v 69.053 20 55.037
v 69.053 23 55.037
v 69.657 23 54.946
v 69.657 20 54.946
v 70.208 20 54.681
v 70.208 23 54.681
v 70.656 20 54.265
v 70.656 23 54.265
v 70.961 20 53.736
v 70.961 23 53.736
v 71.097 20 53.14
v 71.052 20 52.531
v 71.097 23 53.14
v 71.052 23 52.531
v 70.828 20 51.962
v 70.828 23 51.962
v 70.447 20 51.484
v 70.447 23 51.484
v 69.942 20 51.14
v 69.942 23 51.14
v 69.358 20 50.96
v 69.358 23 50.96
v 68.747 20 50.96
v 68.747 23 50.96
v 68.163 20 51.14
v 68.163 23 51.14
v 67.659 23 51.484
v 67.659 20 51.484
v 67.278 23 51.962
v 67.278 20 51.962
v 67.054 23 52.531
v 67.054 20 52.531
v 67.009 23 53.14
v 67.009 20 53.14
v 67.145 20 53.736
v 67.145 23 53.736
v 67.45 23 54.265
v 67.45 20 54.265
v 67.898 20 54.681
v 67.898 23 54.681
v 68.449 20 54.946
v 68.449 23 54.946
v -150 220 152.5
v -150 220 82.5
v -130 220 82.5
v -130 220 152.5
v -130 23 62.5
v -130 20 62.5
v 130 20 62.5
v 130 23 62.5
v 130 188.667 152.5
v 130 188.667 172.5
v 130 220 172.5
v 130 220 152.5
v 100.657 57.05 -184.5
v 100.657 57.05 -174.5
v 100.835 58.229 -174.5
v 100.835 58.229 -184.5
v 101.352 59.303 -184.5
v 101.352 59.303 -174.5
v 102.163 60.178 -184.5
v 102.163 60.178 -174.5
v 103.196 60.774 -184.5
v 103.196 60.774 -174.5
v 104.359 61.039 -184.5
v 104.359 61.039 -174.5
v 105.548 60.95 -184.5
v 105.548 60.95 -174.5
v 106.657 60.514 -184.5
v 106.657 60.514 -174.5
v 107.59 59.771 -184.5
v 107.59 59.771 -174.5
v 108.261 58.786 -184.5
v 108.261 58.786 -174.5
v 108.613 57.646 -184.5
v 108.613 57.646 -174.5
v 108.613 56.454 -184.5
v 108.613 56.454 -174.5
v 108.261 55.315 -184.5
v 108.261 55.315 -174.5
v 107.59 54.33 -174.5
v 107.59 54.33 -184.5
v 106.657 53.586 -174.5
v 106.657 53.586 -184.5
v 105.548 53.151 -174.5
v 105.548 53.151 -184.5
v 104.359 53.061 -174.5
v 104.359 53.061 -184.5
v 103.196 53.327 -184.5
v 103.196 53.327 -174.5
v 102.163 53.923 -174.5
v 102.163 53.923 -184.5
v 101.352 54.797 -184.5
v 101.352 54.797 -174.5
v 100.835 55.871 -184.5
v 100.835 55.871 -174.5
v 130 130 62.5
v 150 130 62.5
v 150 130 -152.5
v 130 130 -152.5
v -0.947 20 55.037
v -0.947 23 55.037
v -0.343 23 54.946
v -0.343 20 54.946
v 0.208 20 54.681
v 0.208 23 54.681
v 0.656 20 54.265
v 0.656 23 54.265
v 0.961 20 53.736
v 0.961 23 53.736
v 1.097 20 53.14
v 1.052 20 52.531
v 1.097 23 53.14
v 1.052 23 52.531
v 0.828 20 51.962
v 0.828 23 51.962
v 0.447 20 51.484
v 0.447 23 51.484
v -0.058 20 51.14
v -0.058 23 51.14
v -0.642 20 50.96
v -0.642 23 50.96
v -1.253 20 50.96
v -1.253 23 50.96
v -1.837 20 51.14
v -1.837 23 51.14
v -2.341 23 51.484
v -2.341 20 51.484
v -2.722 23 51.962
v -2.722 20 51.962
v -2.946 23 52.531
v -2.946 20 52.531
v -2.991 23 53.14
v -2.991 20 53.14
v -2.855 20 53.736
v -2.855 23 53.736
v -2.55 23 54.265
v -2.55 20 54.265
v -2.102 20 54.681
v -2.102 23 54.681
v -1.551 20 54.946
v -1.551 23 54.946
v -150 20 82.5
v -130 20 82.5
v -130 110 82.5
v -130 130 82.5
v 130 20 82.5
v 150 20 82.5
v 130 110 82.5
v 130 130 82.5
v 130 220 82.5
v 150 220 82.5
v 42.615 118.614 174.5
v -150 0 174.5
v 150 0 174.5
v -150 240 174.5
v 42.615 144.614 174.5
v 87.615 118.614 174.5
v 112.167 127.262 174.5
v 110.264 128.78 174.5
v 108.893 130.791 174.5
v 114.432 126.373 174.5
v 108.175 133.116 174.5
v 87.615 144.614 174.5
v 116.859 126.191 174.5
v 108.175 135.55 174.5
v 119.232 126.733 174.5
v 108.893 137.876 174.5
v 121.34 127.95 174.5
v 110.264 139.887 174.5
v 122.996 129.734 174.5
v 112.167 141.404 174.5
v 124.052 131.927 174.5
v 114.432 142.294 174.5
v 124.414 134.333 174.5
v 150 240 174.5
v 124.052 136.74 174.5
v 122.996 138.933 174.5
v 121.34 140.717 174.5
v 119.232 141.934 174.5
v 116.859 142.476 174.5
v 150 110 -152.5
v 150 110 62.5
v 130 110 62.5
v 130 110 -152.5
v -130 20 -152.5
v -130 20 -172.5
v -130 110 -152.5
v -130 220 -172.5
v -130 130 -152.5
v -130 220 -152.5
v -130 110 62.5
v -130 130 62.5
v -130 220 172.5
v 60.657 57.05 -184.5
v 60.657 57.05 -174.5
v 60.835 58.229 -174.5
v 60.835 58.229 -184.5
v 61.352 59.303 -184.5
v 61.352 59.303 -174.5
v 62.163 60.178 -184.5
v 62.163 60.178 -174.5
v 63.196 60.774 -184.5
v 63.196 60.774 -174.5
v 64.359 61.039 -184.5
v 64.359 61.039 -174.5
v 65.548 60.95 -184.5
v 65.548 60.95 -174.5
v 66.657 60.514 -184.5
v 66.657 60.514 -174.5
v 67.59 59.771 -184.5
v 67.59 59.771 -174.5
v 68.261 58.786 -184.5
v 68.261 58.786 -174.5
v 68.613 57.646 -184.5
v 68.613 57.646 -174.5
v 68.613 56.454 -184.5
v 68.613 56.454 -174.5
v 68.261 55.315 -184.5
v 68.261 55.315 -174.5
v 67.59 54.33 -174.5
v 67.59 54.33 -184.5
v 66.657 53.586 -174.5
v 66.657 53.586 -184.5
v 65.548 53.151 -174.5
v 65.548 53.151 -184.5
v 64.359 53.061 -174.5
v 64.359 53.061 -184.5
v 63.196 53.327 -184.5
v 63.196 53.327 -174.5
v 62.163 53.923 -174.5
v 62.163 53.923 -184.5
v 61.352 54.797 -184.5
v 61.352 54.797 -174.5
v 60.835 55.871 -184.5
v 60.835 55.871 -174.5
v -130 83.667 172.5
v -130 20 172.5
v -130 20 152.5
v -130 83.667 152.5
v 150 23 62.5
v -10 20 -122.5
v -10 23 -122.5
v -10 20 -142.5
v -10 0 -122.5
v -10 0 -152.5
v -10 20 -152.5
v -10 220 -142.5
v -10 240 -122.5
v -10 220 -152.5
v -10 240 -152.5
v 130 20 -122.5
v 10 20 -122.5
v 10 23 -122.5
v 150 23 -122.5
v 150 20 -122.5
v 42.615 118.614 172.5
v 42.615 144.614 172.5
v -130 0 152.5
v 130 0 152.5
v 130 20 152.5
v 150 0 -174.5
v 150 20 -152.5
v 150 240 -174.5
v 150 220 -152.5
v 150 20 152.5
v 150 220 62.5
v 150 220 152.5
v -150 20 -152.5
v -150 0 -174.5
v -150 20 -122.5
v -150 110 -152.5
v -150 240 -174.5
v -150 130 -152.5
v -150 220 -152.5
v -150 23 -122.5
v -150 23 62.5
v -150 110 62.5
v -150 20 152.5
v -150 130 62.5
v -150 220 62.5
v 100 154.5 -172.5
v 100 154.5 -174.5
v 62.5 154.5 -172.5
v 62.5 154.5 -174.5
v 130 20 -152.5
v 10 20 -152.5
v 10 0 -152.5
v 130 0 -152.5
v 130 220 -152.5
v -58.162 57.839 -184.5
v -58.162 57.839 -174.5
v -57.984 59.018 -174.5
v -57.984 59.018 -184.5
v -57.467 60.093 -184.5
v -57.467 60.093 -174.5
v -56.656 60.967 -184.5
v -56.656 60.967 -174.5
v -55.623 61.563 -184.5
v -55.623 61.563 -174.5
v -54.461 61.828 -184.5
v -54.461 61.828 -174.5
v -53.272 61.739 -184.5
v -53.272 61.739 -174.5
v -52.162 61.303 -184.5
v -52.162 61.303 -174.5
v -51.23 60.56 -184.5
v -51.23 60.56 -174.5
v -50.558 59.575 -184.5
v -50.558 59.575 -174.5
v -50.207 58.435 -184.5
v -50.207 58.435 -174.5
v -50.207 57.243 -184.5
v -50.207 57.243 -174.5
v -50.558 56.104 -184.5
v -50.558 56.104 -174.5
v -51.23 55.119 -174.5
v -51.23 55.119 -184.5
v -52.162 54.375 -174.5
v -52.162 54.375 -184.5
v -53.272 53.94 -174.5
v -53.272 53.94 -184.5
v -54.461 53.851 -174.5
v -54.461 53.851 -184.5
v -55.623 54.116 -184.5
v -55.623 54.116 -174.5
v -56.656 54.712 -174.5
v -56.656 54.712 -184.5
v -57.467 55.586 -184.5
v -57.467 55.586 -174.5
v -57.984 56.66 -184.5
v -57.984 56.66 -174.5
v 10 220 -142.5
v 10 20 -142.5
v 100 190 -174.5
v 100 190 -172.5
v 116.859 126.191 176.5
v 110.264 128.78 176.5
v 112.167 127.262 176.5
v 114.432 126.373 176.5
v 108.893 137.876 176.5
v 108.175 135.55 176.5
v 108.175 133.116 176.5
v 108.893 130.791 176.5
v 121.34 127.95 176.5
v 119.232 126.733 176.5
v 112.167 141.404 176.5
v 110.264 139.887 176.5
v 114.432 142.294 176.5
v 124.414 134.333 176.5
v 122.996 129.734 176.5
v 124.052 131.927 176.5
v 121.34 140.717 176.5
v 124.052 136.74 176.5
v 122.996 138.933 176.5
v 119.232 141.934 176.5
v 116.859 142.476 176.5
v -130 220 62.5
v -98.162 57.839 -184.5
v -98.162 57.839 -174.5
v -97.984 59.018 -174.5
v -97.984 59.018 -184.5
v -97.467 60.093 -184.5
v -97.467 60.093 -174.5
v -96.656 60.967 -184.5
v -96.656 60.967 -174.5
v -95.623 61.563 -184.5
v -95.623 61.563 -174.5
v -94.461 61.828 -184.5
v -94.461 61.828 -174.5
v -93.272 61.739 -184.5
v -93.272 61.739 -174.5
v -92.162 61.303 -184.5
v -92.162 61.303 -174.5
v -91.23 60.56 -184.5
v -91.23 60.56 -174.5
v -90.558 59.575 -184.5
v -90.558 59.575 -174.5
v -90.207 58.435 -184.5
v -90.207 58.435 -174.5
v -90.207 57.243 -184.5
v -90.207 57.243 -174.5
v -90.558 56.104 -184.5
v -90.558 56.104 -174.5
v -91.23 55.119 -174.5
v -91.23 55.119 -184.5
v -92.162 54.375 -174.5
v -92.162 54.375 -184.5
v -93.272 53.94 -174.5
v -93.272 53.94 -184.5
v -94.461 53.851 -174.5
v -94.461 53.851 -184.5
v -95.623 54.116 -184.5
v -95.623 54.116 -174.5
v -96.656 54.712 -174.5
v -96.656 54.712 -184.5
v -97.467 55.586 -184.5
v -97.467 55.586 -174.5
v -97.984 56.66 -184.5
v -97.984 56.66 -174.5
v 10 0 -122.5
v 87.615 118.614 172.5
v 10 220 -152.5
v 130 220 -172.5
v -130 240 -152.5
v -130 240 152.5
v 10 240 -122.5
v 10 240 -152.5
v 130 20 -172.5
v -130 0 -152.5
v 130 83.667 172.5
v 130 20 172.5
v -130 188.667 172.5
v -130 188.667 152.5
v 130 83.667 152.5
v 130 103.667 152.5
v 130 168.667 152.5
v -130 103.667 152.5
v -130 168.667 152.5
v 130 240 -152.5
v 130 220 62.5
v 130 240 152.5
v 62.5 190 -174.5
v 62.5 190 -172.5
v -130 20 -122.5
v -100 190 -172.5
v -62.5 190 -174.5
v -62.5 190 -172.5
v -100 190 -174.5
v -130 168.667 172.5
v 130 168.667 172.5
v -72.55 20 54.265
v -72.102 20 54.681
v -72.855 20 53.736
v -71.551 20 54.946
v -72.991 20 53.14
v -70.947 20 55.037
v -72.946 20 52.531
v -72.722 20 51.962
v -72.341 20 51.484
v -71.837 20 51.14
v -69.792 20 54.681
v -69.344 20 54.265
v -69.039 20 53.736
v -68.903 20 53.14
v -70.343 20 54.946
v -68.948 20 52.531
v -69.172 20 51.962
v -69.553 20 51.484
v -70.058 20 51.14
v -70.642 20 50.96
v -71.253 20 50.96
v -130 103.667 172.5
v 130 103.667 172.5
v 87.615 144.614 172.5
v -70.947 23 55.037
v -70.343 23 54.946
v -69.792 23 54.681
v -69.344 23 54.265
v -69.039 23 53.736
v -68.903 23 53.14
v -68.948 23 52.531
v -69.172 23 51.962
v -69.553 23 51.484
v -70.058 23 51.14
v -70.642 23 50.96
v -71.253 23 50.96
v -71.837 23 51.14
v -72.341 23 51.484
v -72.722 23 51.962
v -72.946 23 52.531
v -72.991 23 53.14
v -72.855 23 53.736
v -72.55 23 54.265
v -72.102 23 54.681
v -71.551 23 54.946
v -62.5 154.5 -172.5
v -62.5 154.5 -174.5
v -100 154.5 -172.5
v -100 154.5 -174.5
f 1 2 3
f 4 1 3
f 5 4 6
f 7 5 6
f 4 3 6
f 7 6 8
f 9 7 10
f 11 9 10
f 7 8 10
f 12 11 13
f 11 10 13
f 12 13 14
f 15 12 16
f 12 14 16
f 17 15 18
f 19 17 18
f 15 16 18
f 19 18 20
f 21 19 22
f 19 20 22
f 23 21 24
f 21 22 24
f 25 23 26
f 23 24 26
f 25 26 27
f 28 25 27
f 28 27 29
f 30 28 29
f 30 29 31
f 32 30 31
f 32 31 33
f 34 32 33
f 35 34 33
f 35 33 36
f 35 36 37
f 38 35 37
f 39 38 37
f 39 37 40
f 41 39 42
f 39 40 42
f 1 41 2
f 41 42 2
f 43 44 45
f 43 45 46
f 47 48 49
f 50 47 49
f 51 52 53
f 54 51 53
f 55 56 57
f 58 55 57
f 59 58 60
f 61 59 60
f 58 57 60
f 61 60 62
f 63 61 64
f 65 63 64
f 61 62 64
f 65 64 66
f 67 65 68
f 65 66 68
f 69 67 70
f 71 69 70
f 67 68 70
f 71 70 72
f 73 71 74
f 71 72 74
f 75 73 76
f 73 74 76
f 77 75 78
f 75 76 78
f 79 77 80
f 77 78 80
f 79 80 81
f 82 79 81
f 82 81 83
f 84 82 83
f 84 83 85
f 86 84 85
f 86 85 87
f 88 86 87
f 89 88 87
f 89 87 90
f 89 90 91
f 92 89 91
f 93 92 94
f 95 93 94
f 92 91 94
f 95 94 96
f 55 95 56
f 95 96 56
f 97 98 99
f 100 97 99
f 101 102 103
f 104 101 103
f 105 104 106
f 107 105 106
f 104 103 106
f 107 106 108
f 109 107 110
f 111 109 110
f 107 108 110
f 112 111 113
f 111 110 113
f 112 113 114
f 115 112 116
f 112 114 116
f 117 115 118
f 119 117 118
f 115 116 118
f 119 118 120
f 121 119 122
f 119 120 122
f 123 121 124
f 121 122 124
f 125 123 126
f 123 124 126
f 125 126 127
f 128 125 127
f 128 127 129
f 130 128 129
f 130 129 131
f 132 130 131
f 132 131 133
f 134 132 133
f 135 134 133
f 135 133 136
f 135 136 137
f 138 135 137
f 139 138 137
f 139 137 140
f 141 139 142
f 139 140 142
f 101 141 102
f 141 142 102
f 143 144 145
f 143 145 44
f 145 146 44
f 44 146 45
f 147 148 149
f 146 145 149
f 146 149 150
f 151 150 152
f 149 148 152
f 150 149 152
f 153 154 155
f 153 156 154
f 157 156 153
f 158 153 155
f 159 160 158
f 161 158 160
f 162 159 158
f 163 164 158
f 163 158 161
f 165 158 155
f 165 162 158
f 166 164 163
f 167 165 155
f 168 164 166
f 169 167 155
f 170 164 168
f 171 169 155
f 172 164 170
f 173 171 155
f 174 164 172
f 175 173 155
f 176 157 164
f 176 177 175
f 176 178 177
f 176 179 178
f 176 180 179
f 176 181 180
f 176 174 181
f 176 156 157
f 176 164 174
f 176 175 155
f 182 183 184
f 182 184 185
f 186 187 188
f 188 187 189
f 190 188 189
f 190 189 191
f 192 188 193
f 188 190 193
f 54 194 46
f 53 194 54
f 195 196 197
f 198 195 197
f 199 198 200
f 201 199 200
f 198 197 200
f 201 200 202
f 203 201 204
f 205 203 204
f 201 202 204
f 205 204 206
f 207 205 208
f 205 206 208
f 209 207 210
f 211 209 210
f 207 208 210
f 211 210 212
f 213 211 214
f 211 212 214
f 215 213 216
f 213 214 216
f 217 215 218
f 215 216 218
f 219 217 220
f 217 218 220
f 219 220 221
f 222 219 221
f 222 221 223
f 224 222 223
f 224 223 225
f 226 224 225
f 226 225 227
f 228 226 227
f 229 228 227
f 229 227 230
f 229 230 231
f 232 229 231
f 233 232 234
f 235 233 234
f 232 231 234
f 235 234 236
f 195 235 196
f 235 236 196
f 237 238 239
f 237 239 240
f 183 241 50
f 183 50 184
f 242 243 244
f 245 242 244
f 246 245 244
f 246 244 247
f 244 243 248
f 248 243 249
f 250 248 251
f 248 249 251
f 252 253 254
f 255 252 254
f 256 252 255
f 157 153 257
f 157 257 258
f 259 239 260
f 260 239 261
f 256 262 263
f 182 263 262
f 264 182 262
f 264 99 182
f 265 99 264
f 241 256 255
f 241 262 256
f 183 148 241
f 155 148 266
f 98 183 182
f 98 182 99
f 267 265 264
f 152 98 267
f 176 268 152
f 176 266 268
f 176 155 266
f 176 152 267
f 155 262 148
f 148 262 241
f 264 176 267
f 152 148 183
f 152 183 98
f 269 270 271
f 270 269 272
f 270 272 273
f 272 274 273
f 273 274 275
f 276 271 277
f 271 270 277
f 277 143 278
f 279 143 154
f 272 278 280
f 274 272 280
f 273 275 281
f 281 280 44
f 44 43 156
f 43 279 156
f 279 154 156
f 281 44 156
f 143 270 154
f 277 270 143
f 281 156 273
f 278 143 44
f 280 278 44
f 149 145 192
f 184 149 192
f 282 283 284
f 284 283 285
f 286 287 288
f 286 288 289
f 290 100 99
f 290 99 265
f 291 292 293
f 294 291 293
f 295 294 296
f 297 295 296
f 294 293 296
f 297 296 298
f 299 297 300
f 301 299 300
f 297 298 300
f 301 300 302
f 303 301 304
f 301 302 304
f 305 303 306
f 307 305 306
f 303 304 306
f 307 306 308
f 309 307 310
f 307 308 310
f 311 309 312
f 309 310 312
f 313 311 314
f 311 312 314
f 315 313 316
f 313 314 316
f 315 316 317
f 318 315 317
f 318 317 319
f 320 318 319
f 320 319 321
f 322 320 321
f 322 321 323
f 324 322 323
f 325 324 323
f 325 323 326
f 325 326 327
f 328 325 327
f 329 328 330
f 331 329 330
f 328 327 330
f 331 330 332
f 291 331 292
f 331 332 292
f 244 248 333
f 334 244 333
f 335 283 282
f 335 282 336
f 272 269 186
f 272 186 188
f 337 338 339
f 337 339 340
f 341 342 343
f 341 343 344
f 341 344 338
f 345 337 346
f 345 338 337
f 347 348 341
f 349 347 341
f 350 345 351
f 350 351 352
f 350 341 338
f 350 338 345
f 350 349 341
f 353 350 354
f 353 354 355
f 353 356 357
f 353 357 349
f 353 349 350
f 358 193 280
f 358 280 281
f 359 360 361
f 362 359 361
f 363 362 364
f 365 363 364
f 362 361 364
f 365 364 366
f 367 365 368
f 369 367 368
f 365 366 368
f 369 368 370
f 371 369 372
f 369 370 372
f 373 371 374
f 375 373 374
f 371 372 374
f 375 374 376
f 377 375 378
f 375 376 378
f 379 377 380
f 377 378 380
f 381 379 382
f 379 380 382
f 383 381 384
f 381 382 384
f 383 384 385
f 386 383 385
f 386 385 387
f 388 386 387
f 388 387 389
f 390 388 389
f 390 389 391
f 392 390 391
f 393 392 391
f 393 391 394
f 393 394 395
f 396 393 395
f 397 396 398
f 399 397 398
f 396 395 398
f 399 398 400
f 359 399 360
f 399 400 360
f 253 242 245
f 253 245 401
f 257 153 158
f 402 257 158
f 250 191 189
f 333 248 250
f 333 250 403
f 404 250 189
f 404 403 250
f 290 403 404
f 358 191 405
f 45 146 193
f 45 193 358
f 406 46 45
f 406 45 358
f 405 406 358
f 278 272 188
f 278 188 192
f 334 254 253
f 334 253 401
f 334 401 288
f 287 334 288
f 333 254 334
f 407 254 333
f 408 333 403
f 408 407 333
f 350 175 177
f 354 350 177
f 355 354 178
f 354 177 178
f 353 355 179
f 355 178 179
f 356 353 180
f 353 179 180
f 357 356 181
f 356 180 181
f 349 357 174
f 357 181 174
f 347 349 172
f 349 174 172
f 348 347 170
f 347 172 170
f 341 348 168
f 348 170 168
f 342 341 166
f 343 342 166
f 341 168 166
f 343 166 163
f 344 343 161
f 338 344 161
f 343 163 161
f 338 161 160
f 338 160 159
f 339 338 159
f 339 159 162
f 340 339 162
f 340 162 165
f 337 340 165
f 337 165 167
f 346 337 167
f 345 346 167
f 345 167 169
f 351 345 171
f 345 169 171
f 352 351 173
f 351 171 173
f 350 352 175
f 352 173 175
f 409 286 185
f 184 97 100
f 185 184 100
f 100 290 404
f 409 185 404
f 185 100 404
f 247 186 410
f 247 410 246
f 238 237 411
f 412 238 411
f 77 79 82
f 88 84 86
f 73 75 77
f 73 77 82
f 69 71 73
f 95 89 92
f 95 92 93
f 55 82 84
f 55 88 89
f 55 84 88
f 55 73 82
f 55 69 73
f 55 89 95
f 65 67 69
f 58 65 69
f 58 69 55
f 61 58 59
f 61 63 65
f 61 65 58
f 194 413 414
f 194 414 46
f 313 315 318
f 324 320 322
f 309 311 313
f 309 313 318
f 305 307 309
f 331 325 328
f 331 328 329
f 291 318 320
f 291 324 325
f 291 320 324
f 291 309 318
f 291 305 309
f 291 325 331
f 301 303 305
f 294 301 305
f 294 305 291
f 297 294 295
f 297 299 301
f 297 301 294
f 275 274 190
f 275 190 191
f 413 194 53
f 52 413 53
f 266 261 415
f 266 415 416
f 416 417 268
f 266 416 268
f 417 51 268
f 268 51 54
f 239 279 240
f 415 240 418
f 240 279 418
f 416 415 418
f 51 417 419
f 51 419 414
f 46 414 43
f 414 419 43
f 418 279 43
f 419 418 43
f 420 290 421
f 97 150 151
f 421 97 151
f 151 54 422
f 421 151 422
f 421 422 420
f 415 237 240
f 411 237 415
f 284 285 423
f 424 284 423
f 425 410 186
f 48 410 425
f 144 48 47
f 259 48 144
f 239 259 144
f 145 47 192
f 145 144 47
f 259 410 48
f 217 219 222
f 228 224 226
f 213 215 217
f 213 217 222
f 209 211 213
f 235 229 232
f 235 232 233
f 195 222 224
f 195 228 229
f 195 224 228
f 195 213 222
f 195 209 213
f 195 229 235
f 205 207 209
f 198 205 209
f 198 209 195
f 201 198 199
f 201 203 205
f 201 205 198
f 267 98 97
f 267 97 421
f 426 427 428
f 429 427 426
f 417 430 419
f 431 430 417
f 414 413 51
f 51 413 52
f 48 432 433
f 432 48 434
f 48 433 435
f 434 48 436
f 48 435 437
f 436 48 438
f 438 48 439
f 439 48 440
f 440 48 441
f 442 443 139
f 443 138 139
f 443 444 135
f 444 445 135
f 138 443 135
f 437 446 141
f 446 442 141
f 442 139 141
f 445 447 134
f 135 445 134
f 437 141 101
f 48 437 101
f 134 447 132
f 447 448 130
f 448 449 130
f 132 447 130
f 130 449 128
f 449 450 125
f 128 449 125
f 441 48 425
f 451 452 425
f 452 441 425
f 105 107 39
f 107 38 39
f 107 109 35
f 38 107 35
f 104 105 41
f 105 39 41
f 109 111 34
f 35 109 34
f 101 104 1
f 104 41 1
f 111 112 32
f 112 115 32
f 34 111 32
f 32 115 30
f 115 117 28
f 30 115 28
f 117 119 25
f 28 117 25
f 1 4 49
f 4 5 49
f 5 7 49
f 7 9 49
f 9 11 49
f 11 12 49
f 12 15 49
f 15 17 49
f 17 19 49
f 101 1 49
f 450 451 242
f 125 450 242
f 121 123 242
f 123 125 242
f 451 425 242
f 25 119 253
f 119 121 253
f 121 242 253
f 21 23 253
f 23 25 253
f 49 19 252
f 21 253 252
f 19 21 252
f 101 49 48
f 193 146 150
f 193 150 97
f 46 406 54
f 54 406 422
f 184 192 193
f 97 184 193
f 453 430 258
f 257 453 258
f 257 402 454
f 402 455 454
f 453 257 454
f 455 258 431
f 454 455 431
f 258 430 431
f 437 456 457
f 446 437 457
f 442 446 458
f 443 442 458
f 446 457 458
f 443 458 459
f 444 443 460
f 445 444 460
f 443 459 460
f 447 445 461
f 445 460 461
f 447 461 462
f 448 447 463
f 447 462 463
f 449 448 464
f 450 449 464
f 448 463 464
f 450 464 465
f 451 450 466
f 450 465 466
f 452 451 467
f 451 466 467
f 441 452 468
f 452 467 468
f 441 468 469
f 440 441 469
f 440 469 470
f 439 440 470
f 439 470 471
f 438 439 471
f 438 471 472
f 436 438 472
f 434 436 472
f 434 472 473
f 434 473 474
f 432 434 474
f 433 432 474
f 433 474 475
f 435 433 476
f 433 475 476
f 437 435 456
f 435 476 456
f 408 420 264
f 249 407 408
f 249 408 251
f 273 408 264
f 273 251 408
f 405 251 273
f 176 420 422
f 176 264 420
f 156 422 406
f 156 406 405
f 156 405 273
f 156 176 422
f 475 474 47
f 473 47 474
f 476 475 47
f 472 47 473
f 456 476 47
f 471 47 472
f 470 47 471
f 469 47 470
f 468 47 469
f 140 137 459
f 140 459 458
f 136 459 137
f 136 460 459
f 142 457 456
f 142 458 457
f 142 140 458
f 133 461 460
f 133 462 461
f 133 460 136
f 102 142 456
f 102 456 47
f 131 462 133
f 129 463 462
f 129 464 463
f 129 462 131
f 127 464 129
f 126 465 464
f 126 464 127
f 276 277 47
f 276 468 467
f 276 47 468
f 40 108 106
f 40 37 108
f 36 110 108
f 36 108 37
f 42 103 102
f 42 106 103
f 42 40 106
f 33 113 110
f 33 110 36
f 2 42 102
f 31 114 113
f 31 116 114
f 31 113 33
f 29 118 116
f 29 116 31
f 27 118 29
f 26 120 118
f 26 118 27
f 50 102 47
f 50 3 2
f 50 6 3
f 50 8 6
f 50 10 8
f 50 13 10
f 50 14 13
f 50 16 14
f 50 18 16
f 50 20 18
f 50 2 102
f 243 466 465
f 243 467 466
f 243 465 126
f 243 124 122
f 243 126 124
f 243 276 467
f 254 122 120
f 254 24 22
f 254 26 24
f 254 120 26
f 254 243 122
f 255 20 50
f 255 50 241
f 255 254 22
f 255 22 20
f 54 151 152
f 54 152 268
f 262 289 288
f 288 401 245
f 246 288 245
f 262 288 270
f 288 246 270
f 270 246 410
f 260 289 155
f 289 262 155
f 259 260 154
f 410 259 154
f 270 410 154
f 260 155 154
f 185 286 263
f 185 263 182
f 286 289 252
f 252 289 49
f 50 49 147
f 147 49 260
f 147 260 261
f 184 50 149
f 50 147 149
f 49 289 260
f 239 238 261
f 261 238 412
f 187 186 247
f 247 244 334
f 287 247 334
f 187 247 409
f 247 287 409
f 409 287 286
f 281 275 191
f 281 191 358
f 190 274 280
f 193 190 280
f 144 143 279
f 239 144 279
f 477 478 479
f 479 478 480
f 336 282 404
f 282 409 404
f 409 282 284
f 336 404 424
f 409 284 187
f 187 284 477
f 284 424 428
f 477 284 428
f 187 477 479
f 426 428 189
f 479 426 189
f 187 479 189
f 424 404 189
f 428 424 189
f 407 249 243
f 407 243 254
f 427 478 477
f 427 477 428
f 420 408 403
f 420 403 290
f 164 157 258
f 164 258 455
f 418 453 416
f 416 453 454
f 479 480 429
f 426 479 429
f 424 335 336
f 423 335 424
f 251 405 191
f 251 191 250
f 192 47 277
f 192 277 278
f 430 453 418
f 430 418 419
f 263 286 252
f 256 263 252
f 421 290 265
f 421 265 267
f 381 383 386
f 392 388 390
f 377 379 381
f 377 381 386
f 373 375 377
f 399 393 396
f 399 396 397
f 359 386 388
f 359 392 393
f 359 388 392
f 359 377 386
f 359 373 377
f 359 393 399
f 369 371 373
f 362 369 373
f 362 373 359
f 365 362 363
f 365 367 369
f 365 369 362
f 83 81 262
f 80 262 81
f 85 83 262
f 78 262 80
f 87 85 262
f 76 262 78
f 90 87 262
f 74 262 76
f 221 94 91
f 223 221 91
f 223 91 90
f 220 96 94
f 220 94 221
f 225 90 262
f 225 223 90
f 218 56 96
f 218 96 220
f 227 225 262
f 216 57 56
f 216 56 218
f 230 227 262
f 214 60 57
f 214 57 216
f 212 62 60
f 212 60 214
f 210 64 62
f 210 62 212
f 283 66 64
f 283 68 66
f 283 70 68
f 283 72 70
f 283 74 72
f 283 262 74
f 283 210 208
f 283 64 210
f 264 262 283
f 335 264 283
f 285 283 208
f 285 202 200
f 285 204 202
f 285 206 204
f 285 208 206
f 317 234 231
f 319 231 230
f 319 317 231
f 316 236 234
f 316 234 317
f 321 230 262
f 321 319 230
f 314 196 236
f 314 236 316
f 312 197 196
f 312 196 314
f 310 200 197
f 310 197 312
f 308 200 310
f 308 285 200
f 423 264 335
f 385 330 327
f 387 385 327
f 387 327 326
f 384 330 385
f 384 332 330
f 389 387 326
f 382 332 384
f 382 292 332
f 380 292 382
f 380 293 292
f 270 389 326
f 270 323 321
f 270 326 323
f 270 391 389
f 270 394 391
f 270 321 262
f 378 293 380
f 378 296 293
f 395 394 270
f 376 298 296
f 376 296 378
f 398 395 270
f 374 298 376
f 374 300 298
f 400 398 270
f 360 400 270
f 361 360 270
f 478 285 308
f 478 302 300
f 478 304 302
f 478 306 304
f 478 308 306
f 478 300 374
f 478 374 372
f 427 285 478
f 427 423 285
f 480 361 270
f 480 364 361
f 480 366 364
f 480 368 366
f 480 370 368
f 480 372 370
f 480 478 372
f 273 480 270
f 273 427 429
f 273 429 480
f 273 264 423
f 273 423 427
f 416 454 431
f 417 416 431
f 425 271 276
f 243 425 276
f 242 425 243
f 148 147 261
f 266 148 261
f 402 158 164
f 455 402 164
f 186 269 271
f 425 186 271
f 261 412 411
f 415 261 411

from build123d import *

# Parameters (mm, degrees)
SKETCH_1_W          = 300
SKETCH_1_H          = 345
EXTRUDE_1_DEPTH     = 240
SKETCH_2_W          = 260
SKETCH_2_H          = 305
CUT_EXTRUDE_1_DEPTH = 240
SKETCH_3_W          = 260
SKETCH_3_H          = 200
CUT_EXTRUDE_2_DEPTH = 345
SKETCH_4_W          = 305
SKETCH_4_H          = 200
CUT_EXTRUDE_3_DEPTH = 345
SKETCH_5_W          = 20
SKETCH_5_H          = 240
EXTRUDE_2_DEPTH     = 20
SKETCH_6_W          = 20
SKETCH_6_H          = 240
EXTRUDE_3_DEPTH     = 20
SKETCH_10_W         = 20
SKETCH_10_H         = 240
EXTRUDE_7_DEPTH     = 50
SKETCH_11_W         = 20
SKETCH_11_H         = 200
CUT_EXTRUDE_4_DEPTH = 50
SKETCH_12_W         = 20
SKETCH_12_H         = 20
EXTRUDE_8_DEPTH     = 240
SKETCH_13_W         = 20
SKETCH_13_H         = 20
EXTRUDE_9_DEPTH     = 300
SKETCH_14_W         = 300
SKETCH_14_H         = 185
EXTRUDE_10_DEPTH    = 3
SKETCH_15_R         = 2.05
CUT_EXTRUDE_5_DEPTH = 3
SKETCH_16_W         = 215
SKETCH_16_H         = 20
EXTRUDE_11_DEPTH    = 20
SKETCH_17_W         = 215
SKETCH_17_H         = 20
EXTRUDE_12_DEPTH    = 20
SKETCH_18_W         = 300
SKETCH_18_H         = 240
EXTRUDE_13_DEPTH    = 2
SKETCH_20_W         = 300
SKETCH_20_H         = 240
EXTRUDE_14_DEPTH    = 2
SKETCH_21_R         = 8.165036004
EXTRUDE_15_DEPTH    = 2
SKETCH_22_W         = 300
SKETCH_22_H         = 20
EXTRUDE_16_DEPTH    = 22
SKETCH_24_W         = 45
SKETCH_24_H         = 26
CUT_EXTRUDE_6_DEPTH = 2
SKETCH_25_W         = 37.5
SKETCH_25_H         = 35.5
CUT_EXTRUDE_7_DEPTH = 2
SKETCH_26_W         = 37.5
SKETCH_26_H         = 35.5
CUT_EXTRUDE_8_DEPTH = 2
SKETCH_27_R         = 4
EXTRUDE_17_DEPTH    = 10
SKETCH_28_R         = 4
EXTRUDE_18_DEPTH    = 10


with BuildPart() as part:
    # 草图1 → 凸台-拉伸1 (new body)
    with BuildSketch(Plane(origin=(0, 0, 0), x_dir=(1, 0, 0), z_dir=(0, 1, 0))):
        Rectangle(SKETCH_1_W, SKETCH_1_H)
    extrude(amount=EXTRUDE_1_DEPTH)

    # 草图2 → 切除-拉伸1 (cut)
    with BuildSketch(Plane(origin=(0, 240, 0), x_dir=(1, 0, 0), z_dir=(0, 1, 0))):
        Rectangle(SKETCH_2_W, SKETCH_2_H)
    extrude(amount=-CUT_EXTRUDE_1_DEPTH, mode=Mode.SUBTRACT)

    # 草图3 → 切除-拉伸2 (cut)
    with BuildSketch(Plane.XY.offset(172.5)):
        with Locations((0, 120)):
            Rectangle(SKETCH_3_W, SKETCH_3_H)
    extrude(amount=-CUT_EXTRUDE_2_DEPTH, mode=Mode.SUBTRACT)

    # 草图4 → 切除-拉伸3 (cut)
    with BuildSketch(Plane.ZY.offset(150)):
        with Locations((0, 120)):
            Rectangle(SKETCH_4_W, SKETCH_4_H)
    extrude(amount=-CUT_EXTRUDE_3_DEPTH, mode=Mode.SUBTRACT)

    # 草图5 → 凸台-拉伸2 (add)
    with BuildSketch(Plane(origin=(150, 0, 0), x_dir=(0, 0, -1), z_dir=(1, 0, 0))):
        with Locations((-72.5, 120)):
            Rectangle(SKETCH_5_W, SKETCH_5_H)
    extrude(amount=-EXTRUDE_2_DEPTH)

    # 草图6 → 凸台-拉伸3 (add)
    with BuildSketch(Plane.ZY.offset(150)):
        with Locations((72.5, 120)):
            Rectangle(SKETCH_6_W, SKETCH_6_H)
    extrude(amount=-EXTRUDE_3_DEPTH)

    # 草图10 → 凸台-拉伸7 (add)
    with BuildSketch(Plane(origin=(0, 0, -172.5), x_dir=(-1, 0, 0), z_dir=(0, 0, -1))):
        with Locations((0, 120)):
            Rectangle(SKETCH_10_W, SKETCH_10_H)
    extrude(amount=-EXTRUDE_7_DEPTH)

    # 草图11 → 切除-拉伸4 (cut)
    with BuildSketch(Plane(origin=(0, 0, -172.5), x_dir=(-1, 0, 0), z_dir=(0, 0, -1))):
        with Locations((0, 120)):
            Rectangle(SKETCH_11_W, SKETCH_11_H)
    extrude(amount=-CUT_EXTRUDE_4_DEPTH, mode=Mode.SUBTRACT)

    # 草图12 → 凸台-拉伸8 (add)
    with BuildSketch(Plane(origin=(0, 240, 0), x_dir=(1, 0, 0), z_dir=(0, 1, 0))):
        with Locations((0, 132.5)):
            Rectangle(SKETCH_12_W, SKETCH_12_H)
    extrude(amount=-EXTRUDE_8_DEPTH)

    # 草图13 → 凸台-拉伸9 (add)
    with BuildSketch(Plane(origin=(150, 0, 0), x_dir=(0, 0, -1), z_dir=(1, 0, 0))):
        with Locations((-72.5, 120)):
            Rectangle(SKETCH_13_W, SKETCH_13_H)
    extrude(amount=-EXTRUDE_9_DEPTH)

    # 草图14 → 凸台-拉伸10 (add)
    with BuildSketch(Plane(origin=(0, 20, 0), x_dir=(1, 0, 0), z_dir=(0, 1, 0))):
        with Locations((0, 30)):
            Rectangle(SKETCH_14_W, SKETCH_14_H)
    extrude(amount=EXTRUDE_10_DEPTH)

    # 草图15 → 切除-拉伸5 (cut)
    with BuildSketch(Plane(origin=(0, 23, 0), x_dir=(1, 0, 0), z_dir=(0, 1, 0))):
        with Locations(Location((-70.947060375, -52.987042074, 0), (0, 0, 270))):
            Circle(SKETCH_15_R)
        with Locations(Location((-0.947060375, -52.987042074, 0), (0, 0, 270))):
            Circle(SKETCH_15_R)
        with Locations(Location((69.052939625, -52.987042074, 0), (0, 0, 270))):
            Circle(SKETCH_15_R)
    extrude(amount=-CUT_EXTRUDE_5_DEPTH, mode=Mode.SUBTRACT)

    # 草图16 → 凸台-拉伸11 (add)
    with BuildSketch(Plane(origin=(150, 0, 0), x_dir=(0, 0, -1), z_dir=(1, 0, 0))):
        with Locations((45, 120)):
            Rectangle(SKETCH_16_W, SKETCH_16_H)
    extrude(amount=-EXTRUDE_11_DEPTH)

    # 草图17 → 凸台-拉伸12 (add)
    with BuildSketch(Plane.ZY.offset(150)):
        with Locations((-45, 120)):
            Rectangle(SKETCH_17_W, SKETCH_17_H)
    extrude(amount=-EXTRUDE_12_DEPTH)

    # 草图18 → 凸台-拉伸13 (add)
    with BuildSketch(Plane.XY.offset(172.5)):
        with Locations((0, 120)):
            Rectangle(SKETCH_18_W, SKETCH_18_H)
    extrude(amount=EXTRUDE_13_DEPTH)

    # 草图20 → 凸台-拉伸14 (add)
    with BuildSketch(Plane(origin=(0, 0, -172.5), x_dir=(-1, 0, 0), z_dir=(0, 0, -1))):
        with Locations((0, 120)):
            Rectangle(SKETCH_20_W, SKETCH_20_H)
    extrude(amount=EXTRUDE_14_DEPTH)

    # 草图21 → 凸台-拉伸15 (add)
    with BuildSketch(Plane.XY.offset(174.5)):
        with Locations((116.249294112, 134.333303452)):
            Circle(SKETCH_21_R)
    extrude(amount=EXTRUDE_15_DEPTH)

    # 草图22 → 凸台-拉伸16 (add)
    with BuildSketch(Plane.XY.offset(174.5)):
        with Locations((0, 178.667130527)):
            Rectangle(SKETCH_22_W, SKETCH_22_H)
        with Locations((0, 93.667130527)):
            Rectangle(SKETCH_22_W, SKETCH_22_H)
    extrude(amount=-EXTRUDE_16_DEPTH)

    # 草图24 → 切除-拉伸6 (cut)
    with BuildSketch(Plane.XY.offset(174.5)):
        with Locations((65.114949377, 131.614411481)):
            Rectangle(SKETCH_24_W, SKETCH_24_H)
    extrude(amount=-CUT_EXTRUDE_6_DEPTH, mode=Mode.SUBTRACT)

    # 草图25 → 切除-拉伸7 (cut)
    with BuildSketch(Plane(origin=(0, 0, -174.5), x_dir=(-1, 0, 0), z_dir=(0, 0, -1))):
        with Locations((81.25, 172.25)):
            Rectangle(SKETCH_25_W, SKETCH_25_H)
    extrude(amount=-CUT_EXTRUDE_7_DEPTH, mode=Mode.SUBTRACT)

    # 草图26 → 切除-拉伸8 (cut)
    with BuildSketch(Plane(origin=(0, 0, -174.5), x_dir=(-1, 0, 0), z_dir=(0, 0, -1))):
        with Locations((-81.25, 172.25)):
            Rectangle(SKETCH_26_W, SKETCH_26_H)
    extrude(amount=-CUT_EXTRUDE_8_DEPTH, mode=Mode.SUBTRACT)

    # 草图27 → 凸台-拉伸17 (add)
    with BuildSketch(Plane(origin=(0, 0, -174.5), x_dir=(-1, 0, 0), z_dir=(0, 0, -1))):
        with Locations((-104.657434269, 57.050217573)):
            Circle(SKETCH_27_R)
        with Locations((-64.657434269, 57.050217573)):
            Circle(SKETCH_27_R)
    extrude(amount=EXTRUDE_17_DEPTH)

    # 草图28 → 凸台-拉伸18 (add)
    with BuildSketch(Plane(origin=(0, 0, -174.5), x_dir=(-1, 0, 0), z_dir=(0, 0, -1))):
        with Locations((54.161932501, 57.839316769)):
            Circle(SKETCH_28_R)
        with Locations((94.161932501, 57.839316769)):
            Circle(SKETCH_28_R)
    extrude(amount=EXTRUDE_18_DEPTH)


solid = part.part
